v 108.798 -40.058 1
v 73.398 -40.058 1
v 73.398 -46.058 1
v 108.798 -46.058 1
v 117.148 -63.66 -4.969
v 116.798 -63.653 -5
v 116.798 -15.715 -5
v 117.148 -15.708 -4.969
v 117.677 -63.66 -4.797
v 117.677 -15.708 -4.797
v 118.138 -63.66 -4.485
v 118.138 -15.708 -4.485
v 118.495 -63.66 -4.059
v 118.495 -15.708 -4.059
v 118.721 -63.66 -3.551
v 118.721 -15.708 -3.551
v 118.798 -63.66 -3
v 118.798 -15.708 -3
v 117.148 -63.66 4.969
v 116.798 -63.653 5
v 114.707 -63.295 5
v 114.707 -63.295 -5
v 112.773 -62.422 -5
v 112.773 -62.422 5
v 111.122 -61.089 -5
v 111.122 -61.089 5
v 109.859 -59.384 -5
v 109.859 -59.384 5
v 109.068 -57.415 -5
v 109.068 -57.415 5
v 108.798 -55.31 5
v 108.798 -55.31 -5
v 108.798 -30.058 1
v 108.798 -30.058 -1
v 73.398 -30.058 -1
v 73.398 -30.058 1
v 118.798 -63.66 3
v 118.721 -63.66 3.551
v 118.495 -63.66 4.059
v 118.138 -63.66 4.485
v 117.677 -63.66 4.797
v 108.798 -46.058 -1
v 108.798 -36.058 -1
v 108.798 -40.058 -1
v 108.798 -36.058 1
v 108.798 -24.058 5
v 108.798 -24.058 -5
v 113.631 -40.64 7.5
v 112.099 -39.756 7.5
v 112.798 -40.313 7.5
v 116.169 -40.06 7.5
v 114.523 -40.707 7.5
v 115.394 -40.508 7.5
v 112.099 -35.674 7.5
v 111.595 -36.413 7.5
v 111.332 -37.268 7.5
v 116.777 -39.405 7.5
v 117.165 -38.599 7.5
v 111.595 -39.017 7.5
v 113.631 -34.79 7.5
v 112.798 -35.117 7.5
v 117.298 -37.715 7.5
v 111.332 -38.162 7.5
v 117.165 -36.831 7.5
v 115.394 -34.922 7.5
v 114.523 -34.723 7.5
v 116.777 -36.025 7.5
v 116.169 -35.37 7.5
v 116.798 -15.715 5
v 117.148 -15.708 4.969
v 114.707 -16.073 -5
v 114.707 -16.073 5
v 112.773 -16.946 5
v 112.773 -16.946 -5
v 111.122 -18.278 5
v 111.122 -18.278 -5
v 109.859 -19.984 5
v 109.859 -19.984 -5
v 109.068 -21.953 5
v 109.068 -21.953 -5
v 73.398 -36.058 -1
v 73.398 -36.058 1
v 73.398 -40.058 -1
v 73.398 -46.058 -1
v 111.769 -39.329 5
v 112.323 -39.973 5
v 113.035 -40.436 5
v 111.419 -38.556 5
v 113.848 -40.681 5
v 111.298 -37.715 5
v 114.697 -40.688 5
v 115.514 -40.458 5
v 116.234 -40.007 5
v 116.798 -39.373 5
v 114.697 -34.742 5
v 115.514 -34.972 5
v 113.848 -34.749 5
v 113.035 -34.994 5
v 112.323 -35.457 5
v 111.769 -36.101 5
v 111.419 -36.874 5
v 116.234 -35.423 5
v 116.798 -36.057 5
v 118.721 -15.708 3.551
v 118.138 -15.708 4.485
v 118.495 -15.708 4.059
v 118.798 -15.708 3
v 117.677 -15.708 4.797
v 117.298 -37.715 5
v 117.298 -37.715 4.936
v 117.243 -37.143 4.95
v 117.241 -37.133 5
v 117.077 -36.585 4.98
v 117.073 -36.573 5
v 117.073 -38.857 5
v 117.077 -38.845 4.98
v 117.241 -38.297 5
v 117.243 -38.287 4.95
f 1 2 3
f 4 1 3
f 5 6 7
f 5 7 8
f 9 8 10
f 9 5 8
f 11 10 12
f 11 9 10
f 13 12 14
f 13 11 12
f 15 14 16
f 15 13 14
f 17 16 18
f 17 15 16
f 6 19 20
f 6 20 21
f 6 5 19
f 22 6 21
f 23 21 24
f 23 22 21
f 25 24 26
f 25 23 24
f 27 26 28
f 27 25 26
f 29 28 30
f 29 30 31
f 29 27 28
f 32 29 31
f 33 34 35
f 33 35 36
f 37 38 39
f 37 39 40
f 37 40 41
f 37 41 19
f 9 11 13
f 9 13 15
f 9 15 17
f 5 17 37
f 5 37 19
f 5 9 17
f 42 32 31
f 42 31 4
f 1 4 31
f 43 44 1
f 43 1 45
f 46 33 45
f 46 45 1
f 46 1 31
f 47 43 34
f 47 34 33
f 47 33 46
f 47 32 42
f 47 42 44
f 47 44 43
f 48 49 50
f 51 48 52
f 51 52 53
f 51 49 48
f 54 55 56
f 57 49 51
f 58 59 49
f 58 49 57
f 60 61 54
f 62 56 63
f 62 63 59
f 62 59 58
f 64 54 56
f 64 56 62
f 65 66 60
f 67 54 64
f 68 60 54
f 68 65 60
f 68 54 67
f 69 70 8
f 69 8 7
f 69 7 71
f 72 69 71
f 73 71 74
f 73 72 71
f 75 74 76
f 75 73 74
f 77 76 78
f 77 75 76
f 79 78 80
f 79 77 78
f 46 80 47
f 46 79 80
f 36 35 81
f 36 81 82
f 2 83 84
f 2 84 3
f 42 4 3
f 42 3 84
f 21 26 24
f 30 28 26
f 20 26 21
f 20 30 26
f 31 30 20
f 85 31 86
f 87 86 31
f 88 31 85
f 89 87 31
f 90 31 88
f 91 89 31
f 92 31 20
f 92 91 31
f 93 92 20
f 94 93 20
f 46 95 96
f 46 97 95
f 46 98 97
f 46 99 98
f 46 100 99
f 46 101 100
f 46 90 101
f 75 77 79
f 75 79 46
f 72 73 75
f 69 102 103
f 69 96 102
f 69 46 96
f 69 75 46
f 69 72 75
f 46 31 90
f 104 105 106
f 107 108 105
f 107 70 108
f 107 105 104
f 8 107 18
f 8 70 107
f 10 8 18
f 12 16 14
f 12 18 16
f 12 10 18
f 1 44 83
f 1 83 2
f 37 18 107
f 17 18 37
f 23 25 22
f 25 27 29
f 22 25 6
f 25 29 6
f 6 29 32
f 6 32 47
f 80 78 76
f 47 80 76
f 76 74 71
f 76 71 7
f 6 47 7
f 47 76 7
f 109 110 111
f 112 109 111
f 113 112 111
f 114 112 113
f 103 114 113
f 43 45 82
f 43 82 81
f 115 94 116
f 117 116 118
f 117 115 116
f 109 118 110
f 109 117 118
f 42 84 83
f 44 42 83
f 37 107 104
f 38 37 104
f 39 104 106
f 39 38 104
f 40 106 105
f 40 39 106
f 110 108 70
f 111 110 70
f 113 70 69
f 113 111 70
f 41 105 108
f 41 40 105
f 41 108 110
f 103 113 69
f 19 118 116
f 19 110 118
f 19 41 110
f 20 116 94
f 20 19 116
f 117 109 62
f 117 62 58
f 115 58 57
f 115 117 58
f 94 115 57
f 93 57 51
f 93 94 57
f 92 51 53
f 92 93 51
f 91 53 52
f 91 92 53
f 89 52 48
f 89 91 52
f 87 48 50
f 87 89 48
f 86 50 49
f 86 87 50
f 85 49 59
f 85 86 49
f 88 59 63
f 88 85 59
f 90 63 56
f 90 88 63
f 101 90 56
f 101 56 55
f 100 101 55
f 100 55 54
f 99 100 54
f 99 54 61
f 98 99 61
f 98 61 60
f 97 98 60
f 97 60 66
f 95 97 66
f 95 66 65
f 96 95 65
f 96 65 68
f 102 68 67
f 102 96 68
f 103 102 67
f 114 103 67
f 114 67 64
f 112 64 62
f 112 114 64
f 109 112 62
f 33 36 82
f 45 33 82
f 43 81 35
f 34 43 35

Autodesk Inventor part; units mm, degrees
ref_plane "YZ Plane" through (0, 0, 0) normal (1, 0, 0) x (0, 1, 0)
ref_plane "XZ Plane" through (0, 0, 0) normal (0, 1, 0) x (-1, 0, 0)
ref_plane "XY Plane" through (0, 0, 0) normal (0, 0, 1) x (1, 0, 0)
sketch "Sketch1" plane through (0, 0, 0) normal (0, 0, 1) x (1, 0, 0)
  line L0 (118.7984, -15.7076) -> (118.7984, -63.6601)
  line L1 (118.7984, -63.6601) -> (108.7984, -63.6601)
  line L2 (108.7984, -63.6601) -> (108.7984, -15.7076)
  line L3 (108.7984, -15.7076) -> (118.7984, -15.7076)
  line L4 (114.7984, 76.5) -> (114.7984, -850)
  point P0 (0, 0)
  dimension "d0" = 6
  dimension "d1" = 10
extrude "Extrusion1" add sketch "Sketch1" along normal mid plane 10
fillet "Fillet1" radius 8.35 2 edges at (108.7984, -15.7076, 0) (108.7984, -63.6601, 0)
fillet "Fillet2" radius 2 2 edges at (118.7984, -39.6839, -5) (118.7984, -39.6839, 5)
sketch "Sketch2" plane through (108.7984, -55.3101, 5) normal (-1, 0, 0) x (0, 0, 1)
  line L0 (-10, 31.2524) -> (0, 31.2524) projected
  line L1 (-6, 25.2524) -> (-4, 25.2524)
  line L2 (-4, 25.2524) -> (-4, 19.2524)
  line L3 (-4, 19.2524) -> (-6, 19.2524)
  line L4 (-6, 19.2524) -> (-6, 25.2524)
  line L5 (-5, 424.5751) -> (-5, -1099.7802)
  line L6 (-6, 15.2524) -> (-4, 15.2524)
  line L7 (-4, 15.2524) -> (-4, 9.2524)
  line L8 (-4, 9.2524) -> (-6, 9.2524)
  line L9 (-6, 9.2524) -> (-6, 15.2524)
  line L10 (-6.5, 55.3101) -> (-3.5, 55.3101) projected
  line L11 (-3.5, -794.6899) -> (-3.5, 55.3101) projected
  line L12 (-6.5, -794.6899) -> (-3.5, -794.6899) projected
  line L13 (-6.5, -794.6899) -> (-6.5, 55.3101) projected
  point P0 (-5, 55.3101)
  dimension "d6" = 1
  dimension "d7" = 2
  dimension "d8" = 6
  dimension "d9" = 6
  dimension "d12" = 10
extrude "Extrusion2" add sketch "Sketch2" along normal blind 35.4 contours L5 L3 L4 L1 | L1 L2 L3 L5 | L8 L9 L6 L5 | L5 L6 L7 L8
sketch "Sketch3" plane through (0, 0, 5) normal (0, 0, 1) x (1, 0, 0)
  line L0 (108.7984, -55.3101) -> (108.7984, -24.0576) projected
  circle A0 centre (114.2984, -37.715) radius 3
  point P0 (116.7984, -15.715)
  point P1 (0, 0)
  dimension "d19" = 5.5
  dimension "d20" = 22
  dimension "d23" = 6
extrude "Extrusion3" add sketch "Sketch3" along normal mid plane 5
properties part number "ThreadBreak"
